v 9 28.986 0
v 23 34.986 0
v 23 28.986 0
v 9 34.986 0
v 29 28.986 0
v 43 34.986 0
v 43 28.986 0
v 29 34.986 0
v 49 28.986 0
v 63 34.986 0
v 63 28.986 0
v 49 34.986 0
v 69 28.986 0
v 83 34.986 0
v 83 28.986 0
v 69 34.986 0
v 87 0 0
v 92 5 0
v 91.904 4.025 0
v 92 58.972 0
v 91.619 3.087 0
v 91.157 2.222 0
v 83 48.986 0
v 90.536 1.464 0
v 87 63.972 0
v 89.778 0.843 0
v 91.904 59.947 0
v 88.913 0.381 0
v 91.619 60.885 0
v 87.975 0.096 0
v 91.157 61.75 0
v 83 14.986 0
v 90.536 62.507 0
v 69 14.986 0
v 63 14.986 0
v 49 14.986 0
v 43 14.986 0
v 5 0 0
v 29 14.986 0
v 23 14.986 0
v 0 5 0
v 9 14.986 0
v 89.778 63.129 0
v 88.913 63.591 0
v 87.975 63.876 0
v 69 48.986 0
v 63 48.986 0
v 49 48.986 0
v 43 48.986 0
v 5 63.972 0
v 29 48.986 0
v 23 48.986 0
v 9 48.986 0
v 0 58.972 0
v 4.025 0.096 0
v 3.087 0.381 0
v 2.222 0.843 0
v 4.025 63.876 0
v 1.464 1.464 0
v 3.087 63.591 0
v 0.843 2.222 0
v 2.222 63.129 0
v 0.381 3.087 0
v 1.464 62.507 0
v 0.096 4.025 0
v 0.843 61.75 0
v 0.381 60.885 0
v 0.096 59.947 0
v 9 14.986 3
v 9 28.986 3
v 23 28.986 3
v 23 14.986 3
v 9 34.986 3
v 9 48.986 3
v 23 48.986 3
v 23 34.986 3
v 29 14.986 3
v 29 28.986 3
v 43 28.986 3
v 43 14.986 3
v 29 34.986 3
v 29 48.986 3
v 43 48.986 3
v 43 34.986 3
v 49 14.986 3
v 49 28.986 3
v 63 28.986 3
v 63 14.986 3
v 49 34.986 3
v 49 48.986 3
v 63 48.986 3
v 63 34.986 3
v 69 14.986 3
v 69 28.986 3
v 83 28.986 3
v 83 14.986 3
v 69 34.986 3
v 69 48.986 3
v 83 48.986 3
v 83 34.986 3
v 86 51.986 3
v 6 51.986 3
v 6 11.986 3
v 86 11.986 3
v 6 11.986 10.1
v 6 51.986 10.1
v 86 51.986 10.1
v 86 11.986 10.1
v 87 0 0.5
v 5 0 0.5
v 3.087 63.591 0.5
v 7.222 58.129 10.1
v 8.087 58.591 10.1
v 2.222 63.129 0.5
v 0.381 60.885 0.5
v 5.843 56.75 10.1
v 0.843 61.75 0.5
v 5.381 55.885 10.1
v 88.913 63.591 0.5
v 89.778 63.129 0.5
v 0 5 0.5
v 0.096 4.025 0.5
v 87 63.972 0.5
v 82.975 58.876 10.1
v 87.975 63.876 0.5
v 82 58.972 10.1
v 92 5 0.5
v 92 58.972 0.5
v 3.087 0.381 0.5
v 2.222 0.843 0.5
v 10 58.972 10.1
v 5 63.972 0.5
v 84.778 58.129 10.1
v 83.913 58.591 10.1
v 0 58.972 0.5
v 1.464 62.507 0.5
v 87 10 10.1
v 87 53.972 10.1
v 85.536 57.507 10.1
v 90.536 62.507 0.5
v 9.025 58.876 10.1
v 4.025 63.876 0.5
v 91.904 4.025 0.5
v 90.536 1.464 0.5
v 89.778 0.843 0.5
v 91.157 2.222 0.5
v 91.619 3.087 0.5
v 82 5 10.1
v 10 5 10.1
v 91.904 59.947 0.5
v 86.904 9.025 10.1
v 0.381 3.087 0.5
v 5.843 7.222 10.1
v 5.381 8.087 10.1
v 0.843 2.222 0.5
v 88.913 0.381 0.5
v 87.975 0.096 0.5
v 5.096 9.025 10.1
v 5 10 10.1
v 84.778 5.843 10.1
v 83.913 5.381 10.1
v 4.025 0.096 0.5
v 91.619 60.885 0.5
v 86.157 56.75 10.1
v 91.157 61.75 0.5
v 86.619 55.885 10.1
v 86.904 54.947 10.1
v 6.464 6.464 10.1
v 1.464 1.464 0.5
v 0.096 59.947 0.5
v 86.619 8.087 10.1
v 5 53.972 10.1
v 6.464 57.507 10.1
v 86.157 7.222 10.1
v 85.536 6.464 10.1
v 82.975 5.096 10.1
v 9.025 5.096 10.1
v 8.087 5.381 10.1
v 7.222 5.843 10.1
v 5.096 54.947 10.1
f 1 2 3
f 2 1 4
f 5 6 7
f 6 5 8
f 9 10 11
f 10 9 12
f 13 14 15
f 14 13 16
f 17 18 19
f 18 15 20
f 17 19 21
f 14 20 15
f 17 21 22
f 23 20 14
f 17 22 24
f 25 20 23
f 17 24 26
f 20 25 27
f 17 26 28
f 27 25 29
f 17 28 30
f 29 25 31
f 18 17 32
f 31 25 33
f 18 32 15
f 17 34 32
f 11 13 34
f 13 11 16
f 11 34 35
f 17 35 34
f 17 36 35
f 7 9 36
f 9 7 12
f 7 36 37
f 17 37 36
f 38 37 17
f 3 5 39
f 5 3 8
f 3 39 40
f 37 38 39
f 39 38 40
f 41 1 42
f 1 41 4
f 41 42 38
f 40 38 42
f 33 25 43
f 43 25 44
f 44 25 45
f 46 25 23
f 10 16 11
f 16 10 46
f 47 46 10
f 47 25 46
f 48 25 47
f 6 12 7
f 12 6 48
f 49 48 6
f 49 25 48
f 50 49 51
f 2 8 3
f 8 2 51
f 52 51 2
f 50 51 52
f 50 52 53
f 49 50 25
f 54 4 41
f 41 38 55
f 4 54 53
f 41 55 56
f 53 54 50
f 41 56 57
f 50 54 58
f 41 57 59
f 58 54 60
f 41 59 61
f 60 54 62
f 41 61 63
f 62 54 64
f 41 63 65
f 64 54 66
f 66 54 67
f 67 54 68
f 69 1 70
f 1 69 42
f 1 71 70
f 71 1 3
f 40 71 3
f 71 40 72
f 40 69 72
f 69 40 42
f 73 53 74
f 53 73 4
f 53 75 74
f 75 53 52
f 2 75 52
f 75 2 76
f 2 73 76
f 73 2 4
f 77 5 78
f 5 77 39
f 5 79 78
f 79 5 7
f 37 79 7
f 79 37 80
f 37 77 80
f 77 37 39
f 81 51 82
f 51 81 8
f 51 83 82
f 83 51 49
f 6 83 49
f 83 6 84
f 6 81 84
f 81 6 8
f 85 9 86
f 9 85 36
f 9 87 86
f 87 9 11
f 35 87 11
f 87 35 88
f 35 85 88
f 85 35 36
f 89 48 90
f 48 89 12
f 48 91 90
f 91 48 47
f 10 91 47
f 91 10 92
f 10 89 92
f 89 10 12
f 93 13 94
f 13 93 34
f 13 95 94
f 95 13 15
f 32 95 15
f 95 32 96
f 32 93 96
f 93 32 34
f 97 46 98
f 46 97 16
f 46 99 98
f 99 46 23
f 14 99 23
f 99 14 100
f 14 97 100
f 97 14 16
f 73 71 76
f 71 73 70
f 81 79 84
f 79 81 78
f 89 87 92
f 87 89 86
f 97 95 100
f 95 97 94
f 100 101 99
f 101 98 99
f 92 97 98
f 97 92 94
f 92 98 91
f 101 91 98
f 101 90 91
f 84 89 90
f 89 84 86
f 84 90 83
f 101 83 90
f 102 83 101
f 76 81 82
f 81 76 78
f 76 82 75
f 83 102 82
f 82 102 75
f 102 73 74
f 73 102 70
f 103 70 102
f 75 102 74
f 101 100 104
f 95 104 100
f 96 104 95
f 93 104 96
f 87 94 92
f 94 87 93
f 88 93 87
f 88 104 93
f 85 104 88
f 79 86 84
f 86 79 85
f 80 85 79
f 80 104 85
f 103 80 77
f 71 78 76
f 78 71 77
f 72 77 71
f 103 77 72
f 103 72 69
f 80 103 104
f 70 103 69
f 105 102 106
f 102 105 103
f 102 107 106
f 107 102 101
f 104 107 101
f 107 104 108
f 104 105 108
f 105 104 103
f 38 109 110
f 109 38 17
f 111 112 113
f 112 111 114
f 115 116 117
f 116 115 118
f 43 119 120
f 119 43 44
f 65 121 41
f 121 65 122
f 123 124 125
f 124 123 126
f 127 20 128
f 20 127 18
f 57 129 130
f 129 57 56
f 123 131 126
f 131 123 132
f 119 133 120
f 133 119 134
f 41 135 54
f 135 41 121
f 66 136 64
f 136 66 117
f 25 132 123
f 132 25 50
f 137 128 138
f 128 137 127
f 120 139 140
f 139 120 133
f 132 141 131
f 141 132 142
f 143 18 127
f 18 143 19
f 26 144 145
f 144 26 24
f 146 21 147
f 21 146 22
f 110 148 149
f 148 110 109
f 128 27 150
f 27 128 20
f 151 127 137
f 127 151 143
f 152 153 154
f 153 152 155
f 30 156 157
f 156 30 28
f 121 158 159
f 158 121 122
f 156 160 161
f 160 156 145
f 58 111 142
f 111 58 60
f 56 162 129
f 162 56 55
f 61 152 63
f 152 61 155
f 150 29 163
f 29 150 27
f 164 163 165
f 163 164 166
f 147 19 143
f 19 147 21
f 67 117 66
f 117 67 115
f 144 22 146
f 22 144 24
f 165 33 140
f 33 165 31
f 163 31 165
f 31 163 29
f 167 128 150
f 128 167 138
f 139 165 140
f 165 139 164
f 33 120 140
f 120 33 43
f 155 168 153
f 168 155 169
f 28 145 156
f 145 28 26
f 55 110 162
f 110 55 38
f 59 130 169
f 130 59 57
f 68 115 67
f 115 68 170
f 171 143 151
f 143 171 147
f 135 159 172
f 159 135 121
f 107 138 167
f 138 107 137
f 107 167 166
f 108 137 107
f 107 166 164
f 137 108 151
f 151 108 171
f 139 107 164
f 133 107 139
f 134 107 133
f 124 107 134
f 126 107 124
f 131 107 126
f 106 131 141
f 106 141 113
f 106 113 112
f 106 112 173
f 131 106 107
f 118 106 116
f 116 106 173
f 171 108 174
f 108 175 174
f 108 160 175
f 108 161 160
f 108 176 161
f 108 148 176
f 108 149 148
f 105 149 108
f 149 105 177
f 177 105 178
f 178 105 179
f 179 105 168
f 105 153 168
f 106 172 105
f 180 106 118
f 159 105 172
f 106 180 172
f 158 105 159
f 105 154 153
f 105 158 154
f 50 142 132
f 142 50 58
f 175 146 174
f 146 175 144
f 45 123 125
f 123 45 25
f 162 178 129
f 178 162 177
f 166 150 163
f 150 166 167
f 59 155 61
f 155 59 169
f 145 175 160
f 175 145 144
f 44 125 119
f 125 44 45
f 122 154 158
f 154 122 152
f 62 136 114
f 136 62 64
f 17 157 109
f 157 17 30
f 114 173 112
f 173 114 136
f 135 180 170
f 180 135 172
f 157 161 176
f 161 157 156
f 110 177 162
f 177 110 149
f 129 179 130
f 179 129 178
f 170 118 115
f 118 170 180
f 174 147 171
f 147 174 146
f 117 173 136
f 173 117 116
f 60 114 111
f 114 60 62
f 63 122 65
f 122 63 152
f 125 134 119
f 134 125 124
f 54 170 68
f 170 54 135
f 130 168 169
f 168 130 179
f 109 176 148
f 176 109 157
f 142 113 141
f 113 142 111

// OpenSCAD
// constants/measurements

$fn = 32;

pi3_width = 85;
pi3_height = 56;

pi3_ether_inset = 37;
pi3_ether_height = 14;
pi3_ether_width = 16.5;
pi3_usb_width = 16;
pi3_usb_height = 17;
pi3_usb1_inset = 1;
pi3_usb2_inset = 18.5;
pi3_sd_width = 16;
pi3_sd_inset = 20;
pi3_sd_height = 3;
pi3_audio_inset = 28;
pi3_audio_width = 7.5;
pi3_audio_height = 7;
pi3_hdmi_inset = 45;
pi3_hdmi_width = 17;
pi3_hdmi_height = 7;
pi3_power_inset = 69;
pi3_power_width = 12;
pi3_power_height = 7;

pi3_standoff_x1 = 23.5;
pi3_standoff_x2 = 81.5;
pi3_standoff_y1 = 3.5;
pi3_standoff_y2 = 52.5;

standoff_width = 5;
standoff_height = 20;
standoff_inset = 1;

switch_well_width = 14;
switch_well_depth = 6;
switch_footprint_depth = 7;
switch_footprint_width = 20;

top_angle = 10; // degrees
plate_upset = standoff_height;
case_underlap = 3;
breathing_room = 2;
wall_thickness = 1.5;
outer_radius = 5;
//cutout_radius = 1;
bevel = 5;

rows = 2;
cols = 4;

// actual output

//translate([0, 0, plate_upset]) rotate([top_angle, 0, 0])
    switchplate();
//pi_housing();

// modules

module rounded_rect(w, h, r) {
    minkowski() {
        circle(r);
        translate([r,r,0]) square([w-2*r, h-2*r]);
    }
}

module pi_housing() {
    housing_width = pi3_width + 2*(breathing_room + wall_thickness);
    housing_height = pi3_height + 2*(breathing_room + wall_thickness);
    housing_depth = case_underlap + plate_upset + housing_height*sin(top_angle);
    
    ct = (breathing_room + wall_thickness) * 3; // cutout_thickness
    ch = ct / 2; // cutout_thickness_half
    
    difference() {
        // base
        translate([0, 0, -case_underlap])
            linear_extrude(0, 0, housing_depth)
                rounded_rect(housing_width, housing_height, outer_radius);
        // chop off the top
        translate([0, 0, plate_upset])
            rotate([top_angle, 0, 0])
                linear_extrude(0, 0, housing_width)
                    square(housing_width);
        // cut out the inside
        translate([wall_thickness, wall_thickness, -case_underlap])
            linear_extrude(0, 0, housing_width)
                rounded_rect(housing_width - 2*wall_thickness, housing_height - 2*wall_thickness, outer_radius - wall_thickness);
        // cutouts for side access
        translate([wall_thickness + breathing_room, wall_thickness + breathing_room, 0]) union() {
            // ethernet + usb (left side)
            translate([-ch, pi3_usb1_inset, 0])
                linear_extrude(0, 0, pi3_usb_height)
                    square([ct, pi3_usb_width]);
            translate([-ch, pi3_usb2_inset, 0])
                linear_extrude(0, 0, pi3_usb_height)
                    square([ct, pi3_usb_width]);
            translate([-ch, pi3_ether_inset, 0])
                linear_extrude(0, 0, pi3_ether_height)
                    square([ct, pi3_ether_width]);
            // audio + hdmi + power (top side)
            translate([0, pi3_height - ch, 0]) union() {
                translate([pi3_audio_inset, 0, 0])
                    linear_extrude(0, 0, pi3_audio_height)
                        square([pi3_audio_width, ct]);
                translate([pi3_hdmi_inset, 0, 0])
                    linear_extrude(0, 0, pi3_hdmi_height)
                        square([pi3_hdmi_width, ct]);
                translate([pi3_power_inset, 0, -case_underlap])
                    linear_extrude(0, 0, pi3_power_height)
                        square([pi3_power_width, ct]);
            }
            // sd (right side)
            translate([pi3_width - ch, pi3_sd_inset, -case_underlap])
                linear_extrude(0, 0, pi3_sd_height)
                    square([ct, pi3_sd_width]);
        }
    }
    
    // internal standoffs
    translate([wall_thickness + breathing_room, wall_thickness, 0])
        linear_extrude(0, 0, standoff_height) union() {
            translate([pi3_standoff_x1 - standoff_width/2, pi3_standoff_y1 - standoff_width/2 - standoff_inset, 0]) square([standoff_width, standoff_width + standoff_inset + breathing_room]);
            translate([pi3_standoff_x2 - standoff_width/2, pi3_standoff_y1 - standoff_width/2 - standoff_inset, 0]) square([standoff_width + standoff_inset + breathing_room, standoff_width + standoff_inset + breathing_room]);
            translate([pi3_standoff_x2 - standoff_width/2, pi3_standoff_y2 - standoff_width/2 + breathing_room, 0]) square([standoff_width + standoff_inset + breathing_room, standoff_width + standoff_inset + breathing_room]);
            translate([pi3_standoff_x1 - standoff_width/2, pi3_standoff_y2 - standoff_width/2 + breathing_room, 0]) square([standoff_width, standoff_width + standoff_inset + breathing_room]);
        }
}

module switchplate() {
    plate_width = pi3_width + 2*(breathing_room + wall_thickness);
    plate_height = (pi3_height + 2*(breathing_room + wall_thickness)) / cos(top_angle);
    plate_thickness = bevel*2;
    
    difference () {
        hull() {
            linear_extrude(0, 0, 0.5)
                rounded_rect(plate_width, plate_height, outer_radius);
            translate([bevel, bevel, plate_thickness])
                linear_extrude(0, 0, 0.1)
                    rounded_rect(plate_width - 2*bevel, plate_height - 2*bevel, outer_radius);
        }
        translate([
                (plate_width -(cols * switch_footprint_width))/2,
                (plate_height-(rows * switch_footprint_width))/2,
            0]) union() {
            for (x = [0:1:cols-1]) {
                for (y = [0:1:rows-1]) {
                    linear_extrude(0, 0, plate_thickness + 1)
                        translate([
                                x*switch_footprint_width + (switch_footprint_width - switch_well_width)/2,
                                y*switch_footprint_width + (switch_footprint_width - switch_well_width)/2,
                            0])
                            square(switch_well_width);
                }
            }
            translate([0,0,plate_thickness - switch_footprint_depth])
                linear_extrude(0, 0, switch_footprint_depth+1)
                    square([cols * switch_footprint_width, rows * switch_footprint_width]);
        }
    }
}
